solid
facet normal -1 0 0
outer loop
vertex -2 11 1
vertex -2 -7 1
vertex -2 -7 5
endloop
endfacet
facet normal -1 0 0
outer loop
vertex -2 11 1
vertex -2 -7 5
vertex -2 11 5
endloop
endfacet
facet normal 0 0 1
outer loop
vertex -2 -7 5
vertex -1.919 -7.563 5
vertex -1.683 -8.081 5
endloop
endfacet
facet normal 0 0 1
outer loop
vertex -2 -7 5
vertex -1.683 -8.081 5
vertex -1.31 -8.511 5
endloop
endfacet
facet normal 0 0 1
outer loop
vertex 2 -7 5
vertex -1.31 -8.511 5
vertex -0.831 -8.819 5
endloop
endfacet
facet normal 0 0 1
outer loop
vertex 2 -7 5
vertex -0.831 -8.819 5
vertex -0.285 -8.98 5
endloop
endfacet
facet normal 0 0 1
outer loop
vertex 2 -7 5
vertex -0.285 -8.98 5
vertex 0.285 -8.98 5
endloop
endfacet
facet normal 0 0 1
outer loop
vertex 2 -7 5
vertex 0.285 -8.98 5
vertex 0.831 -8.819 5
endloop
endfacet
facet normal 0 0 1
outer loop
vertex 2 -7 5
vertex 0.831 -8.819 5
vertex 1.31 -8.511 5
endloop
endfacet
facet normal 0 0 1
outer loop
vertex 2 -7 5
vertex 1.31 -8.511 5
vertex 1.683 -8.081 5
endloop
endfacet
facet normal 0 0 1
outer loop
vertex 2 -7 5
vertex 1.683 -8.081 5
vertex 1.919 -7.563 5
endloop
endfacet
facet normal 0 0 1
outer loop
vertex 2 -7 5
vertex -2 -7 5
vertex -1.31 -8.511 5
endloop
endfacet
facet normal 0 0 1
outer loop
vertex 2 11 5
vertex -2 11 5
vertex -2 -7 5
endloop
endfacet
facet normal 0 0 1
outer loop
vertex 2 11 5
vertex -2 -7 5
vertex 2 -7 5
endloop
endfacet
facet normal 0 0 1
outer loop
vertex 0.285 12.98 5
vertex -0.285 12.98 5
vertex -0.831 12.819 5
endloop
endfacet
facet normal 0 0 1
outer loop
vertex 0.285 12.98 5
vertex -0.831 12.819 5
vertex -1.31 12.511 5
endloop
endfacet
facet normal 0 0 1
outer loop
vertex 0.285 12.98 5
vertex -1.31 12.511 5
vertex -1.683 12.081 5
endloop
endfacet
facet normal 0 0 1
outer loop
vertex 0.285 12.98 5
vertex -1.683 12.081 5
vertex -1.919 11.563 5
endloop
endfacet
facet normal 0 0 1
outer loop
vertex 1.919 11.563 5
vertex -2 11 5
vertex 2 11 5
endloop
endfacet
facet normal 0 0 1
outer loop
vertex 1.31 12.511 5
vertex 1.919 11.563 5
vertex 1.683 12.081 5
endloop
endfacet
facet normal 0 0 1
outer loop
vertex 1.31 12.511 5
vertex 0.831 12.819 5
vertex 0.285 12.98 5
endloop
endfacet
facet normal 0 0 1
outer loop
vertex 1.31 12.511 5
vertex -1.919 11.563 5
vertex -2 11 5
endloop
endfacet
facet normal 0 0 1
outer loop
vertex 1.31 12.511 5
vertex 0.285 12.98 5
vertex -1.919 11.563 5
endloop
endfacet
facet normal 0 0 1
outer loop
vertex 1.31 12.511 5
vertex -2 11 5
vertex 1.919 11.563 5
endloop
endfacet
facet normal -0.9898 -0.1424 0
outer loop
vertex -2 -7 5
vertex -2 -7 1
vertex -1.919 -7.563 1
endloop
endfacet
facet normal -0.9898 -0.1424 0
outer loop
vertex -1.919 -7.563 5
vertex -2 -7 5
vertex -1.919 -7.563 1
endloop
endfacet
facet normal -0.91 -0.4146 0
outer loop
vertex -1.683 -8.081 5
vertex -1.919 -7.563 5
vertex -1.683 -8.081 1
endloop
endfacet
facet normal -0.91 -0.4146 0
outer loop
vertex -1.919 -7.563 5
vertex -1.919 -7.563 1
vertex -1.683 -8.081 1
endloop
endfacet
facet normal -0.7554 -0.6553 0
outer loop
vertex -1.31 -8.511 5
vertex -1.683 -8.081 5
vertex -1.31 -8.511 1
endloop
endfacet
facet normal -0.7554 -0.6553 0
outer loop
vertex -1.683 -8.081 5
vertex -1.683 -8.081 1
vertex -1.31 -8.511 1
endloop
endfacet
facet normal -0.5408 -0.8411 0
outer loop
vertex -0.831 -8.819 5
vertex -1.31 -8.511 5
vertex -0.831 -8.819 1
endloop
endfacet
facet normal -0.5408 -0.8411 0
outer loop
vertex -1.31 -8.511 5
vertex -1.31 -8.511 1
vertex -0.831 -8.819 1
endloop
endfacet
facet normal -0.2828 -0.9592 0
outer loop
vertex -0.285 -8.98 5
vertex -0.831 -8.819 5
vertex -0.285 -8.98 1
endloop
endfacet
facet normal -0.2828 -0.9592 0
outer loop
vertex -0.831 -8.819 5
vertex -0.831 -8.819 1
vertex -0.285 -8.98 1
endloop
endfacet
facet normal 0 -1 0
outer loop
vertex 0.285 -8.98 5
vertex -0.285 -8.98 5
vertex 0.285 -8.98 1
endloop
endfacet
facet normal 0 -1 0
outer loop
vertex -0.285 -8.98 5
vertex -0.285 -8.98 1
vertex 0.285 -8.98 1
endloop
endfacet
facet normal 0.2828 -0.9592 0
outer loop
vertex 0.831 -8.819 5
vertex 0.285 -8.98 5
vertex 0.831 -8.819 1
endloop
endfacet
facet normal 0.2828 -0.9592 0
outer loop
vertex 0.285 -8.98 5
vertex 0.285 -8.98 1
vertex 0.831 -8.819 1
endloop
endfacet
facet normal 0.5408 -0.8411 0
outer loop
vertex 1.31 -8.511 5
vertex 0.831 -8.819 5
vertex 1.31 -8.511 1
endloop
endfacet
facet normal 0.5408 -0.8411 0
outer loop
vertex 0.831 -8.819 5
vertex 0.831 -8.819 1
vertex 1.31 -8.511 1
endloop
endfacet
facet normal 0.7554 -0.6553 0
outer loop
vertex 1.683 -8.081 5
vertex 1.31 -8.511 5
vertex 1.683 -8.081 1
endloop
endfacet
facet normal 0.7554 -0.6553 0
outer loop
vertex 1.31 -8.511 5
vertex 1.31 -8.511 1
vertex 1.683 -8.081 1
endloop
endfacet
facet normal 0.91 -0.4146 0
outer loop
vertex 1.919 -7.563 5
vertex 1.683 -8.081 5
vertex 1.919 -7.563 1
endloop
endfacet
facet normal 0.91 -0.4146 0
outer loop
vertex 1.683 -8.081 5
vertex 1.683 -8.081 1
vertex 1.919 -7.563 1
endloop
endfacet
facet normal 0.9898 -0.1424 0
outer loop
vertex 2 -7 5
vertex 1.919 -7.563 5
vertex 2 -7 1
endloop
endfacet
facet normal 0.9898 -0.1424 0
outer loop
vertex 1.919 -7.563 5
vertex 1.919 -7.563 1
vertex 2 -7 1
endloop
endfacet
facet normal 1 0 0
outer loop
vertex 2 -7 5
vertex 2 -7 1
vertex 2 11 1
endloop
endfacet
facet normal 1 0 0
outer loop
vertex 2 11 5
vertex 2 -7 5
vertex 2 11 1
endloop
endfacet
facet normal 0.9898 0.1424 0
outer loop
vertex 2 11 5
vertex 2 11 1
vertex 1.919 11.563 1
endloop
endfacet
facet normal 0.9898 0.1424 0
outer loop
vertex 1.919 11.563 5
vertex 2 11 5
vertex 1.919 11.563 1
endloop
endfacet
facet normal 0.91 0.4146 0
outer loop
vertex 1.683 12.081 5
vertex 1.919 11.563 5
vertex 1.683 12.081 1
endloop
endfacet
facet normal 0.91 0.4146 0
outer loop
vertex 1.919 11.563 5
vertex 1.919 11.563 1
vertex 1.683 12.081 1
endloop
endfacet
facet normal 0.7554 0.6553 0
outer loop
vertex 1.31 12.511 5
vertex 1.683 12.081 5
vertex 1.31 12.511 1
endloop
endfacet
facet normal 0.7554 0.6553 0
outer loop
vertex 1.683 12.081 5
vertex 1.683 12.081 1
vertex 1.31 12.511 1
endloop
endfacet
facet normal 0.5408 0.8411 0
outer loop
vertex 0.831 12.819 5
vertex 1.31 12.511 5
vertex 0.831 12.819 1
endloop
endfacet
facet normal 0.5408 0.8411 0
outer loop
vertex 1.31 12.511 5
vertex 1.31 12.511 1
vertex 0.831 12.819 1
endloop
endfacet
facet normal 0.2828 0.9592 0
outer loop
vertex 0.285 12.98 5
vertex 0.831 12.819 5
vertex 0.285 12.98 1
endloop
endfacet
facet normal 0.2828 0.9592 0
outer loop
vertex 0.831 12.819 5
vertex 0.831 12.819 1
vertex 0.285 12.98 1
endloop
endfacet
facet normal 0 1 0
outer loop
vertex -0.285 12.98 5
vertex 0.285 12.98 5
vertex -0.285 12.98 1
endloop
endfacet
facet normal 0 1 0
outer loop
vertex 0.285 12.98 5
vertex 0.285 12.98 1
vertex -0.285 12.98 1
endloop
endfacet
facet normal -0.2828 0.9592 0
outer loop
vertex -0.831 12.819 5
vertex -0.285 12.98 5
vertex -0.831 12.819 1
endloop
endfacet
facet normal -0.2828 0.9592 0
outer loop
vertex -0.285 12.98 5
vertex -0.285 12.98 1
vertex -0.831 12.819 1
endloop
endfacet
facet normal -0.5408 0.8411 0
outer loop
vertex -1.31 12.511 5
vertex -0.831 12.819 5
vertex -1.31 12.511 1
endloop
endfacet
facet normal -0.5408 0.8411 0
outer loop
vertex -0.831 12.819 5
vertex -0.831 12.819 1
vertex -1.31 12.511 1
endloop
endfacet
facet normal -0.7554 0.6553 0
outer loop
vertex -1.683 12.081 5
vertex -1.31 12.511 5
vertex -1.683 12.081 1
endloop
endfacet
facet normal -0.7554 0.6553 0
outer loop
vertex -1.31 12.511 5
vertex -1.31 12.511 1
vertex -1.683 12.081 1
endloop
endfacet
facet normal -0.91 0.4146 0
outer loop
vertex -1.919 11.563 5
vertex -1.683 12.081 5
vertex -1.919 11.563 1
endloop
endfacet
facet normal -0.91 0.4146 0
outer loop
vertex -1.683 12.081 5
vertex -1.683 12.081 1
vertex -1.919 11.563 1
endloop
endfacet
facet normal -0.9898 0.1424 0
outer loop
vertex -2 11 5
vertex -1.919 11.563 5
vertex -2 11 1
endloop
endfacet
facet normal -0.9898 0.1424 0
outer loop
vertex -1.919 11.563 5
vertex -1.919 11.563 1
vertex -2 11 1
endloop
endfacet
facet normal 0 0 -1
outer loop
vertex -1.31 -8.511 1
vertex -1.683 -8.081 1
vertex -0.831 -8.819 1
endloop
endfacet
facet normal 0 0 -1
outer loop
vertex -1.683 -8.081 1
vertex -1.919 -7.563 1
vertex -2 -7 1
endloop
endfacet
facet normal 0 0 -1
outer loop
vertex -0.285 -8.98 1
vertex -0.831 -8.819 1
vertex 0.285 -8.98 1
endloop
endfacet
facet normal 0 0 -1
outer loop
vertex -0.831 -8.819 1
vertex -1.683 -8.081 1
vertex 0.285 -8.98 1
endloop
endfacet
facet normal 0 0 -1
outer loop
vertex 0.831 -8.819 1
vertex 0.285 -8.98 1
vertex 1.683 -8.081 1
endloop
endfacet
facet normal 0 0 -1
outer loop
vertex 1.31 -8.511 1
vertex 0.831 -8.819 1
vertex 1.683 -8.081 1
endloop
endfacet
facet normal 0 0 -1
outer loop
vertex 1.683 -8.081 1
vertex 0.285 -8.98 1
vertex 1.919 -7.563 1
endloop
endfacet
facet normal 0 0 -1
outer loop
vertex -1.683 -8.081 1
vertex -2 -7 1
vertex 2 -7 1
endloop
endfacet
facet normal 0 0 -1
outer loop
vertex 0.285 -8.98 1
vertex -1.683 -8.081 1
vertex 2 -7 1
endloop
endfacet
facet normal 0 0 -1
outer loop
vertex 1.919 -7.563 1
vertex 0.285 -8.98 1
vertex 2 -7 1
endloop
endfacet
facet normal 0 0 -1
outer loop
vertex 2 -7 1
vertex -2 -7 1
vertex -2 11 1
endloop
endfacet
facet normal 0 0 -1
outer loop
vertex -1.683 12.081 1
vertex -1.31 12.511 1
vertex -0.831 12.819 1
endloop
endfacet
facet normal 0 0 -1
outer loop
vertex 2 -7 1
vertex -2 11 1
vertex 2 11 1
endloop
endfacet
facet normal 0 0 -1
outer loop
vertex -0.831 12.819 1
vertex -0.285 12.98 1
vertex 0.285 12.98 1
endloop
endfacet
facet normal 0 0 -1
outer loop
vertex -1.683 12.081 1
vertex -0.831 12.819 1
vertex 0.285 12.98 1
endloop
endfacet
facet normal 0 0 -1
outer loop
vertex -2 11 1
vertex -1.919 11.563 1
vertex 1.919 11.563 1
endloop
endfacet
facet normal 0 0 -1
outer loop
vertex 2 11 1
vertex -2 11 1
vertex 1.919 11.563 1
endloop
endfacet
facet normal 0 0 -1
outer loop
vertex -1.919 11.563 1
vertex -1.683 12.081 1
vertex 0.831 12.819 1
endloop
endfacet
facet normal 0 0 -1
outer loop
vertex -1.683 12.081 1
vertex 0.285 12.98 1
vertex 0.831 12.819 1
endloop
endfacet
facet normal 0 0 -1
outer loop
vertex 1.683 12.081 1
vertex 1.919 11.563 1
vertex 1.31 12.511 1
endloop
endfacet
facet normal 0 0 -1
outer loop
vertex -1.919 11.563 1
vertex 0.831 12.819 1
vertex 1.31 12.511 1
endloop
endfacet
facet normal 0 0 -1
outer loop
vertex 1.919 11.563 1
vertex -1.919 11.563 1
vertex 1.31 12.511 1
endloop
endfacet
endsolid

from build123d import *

# Parameters (mm, degrees)
CYLINDER002_R     = 2
CYLINDER002_DEPTH = 4
CYLINDER003_R     = 2
CYLINDER003_DEPTH = 4
BOX001_W          = 4
BOX001_H          = 18
BOX001_DEPTH      = 4


with BuildPart() as cilindro:
    # Cylinder002 → Cylinder002 (new body)
    with BuildSketch(Plane(origin=(0, 11, 1), x_dir=(1, 0, 0), z_dir=(0, 0, 1))):
        Circle(CYLINDER002_R)
    extrude(amount=CYLINDER002_DEPTH)


with BuildPart() as cilindro001:
    # Cylinder003 → Cylinder003 (new body)
    with BuildSketch(Plane(origin=(0, -7, 1), x_dir=(1, 0, 0), z_dir=(0, 0, 1))):
        Circle(CYLINDER003_R)
    extrude(amount=CYLINDER003_DEPTH)


with BuildPart() as fusion:
    # Box001 → Box001 (new body)
    with BuildSketch(Plane(origin=(-2, -7, 1), x_dir=(1, 0, 0), z_dir=(0, 0, 1))):
        with Locations((2, 9)):
            Rectangle(BOX001_W, BOX001_H)
    extrude(amount=BOX001_DEPTH)

    # Fusion: union Cilindro, Cilindro001
    add(cilindro.part)
    add(cilindro001.part)


solid = fusion.part
